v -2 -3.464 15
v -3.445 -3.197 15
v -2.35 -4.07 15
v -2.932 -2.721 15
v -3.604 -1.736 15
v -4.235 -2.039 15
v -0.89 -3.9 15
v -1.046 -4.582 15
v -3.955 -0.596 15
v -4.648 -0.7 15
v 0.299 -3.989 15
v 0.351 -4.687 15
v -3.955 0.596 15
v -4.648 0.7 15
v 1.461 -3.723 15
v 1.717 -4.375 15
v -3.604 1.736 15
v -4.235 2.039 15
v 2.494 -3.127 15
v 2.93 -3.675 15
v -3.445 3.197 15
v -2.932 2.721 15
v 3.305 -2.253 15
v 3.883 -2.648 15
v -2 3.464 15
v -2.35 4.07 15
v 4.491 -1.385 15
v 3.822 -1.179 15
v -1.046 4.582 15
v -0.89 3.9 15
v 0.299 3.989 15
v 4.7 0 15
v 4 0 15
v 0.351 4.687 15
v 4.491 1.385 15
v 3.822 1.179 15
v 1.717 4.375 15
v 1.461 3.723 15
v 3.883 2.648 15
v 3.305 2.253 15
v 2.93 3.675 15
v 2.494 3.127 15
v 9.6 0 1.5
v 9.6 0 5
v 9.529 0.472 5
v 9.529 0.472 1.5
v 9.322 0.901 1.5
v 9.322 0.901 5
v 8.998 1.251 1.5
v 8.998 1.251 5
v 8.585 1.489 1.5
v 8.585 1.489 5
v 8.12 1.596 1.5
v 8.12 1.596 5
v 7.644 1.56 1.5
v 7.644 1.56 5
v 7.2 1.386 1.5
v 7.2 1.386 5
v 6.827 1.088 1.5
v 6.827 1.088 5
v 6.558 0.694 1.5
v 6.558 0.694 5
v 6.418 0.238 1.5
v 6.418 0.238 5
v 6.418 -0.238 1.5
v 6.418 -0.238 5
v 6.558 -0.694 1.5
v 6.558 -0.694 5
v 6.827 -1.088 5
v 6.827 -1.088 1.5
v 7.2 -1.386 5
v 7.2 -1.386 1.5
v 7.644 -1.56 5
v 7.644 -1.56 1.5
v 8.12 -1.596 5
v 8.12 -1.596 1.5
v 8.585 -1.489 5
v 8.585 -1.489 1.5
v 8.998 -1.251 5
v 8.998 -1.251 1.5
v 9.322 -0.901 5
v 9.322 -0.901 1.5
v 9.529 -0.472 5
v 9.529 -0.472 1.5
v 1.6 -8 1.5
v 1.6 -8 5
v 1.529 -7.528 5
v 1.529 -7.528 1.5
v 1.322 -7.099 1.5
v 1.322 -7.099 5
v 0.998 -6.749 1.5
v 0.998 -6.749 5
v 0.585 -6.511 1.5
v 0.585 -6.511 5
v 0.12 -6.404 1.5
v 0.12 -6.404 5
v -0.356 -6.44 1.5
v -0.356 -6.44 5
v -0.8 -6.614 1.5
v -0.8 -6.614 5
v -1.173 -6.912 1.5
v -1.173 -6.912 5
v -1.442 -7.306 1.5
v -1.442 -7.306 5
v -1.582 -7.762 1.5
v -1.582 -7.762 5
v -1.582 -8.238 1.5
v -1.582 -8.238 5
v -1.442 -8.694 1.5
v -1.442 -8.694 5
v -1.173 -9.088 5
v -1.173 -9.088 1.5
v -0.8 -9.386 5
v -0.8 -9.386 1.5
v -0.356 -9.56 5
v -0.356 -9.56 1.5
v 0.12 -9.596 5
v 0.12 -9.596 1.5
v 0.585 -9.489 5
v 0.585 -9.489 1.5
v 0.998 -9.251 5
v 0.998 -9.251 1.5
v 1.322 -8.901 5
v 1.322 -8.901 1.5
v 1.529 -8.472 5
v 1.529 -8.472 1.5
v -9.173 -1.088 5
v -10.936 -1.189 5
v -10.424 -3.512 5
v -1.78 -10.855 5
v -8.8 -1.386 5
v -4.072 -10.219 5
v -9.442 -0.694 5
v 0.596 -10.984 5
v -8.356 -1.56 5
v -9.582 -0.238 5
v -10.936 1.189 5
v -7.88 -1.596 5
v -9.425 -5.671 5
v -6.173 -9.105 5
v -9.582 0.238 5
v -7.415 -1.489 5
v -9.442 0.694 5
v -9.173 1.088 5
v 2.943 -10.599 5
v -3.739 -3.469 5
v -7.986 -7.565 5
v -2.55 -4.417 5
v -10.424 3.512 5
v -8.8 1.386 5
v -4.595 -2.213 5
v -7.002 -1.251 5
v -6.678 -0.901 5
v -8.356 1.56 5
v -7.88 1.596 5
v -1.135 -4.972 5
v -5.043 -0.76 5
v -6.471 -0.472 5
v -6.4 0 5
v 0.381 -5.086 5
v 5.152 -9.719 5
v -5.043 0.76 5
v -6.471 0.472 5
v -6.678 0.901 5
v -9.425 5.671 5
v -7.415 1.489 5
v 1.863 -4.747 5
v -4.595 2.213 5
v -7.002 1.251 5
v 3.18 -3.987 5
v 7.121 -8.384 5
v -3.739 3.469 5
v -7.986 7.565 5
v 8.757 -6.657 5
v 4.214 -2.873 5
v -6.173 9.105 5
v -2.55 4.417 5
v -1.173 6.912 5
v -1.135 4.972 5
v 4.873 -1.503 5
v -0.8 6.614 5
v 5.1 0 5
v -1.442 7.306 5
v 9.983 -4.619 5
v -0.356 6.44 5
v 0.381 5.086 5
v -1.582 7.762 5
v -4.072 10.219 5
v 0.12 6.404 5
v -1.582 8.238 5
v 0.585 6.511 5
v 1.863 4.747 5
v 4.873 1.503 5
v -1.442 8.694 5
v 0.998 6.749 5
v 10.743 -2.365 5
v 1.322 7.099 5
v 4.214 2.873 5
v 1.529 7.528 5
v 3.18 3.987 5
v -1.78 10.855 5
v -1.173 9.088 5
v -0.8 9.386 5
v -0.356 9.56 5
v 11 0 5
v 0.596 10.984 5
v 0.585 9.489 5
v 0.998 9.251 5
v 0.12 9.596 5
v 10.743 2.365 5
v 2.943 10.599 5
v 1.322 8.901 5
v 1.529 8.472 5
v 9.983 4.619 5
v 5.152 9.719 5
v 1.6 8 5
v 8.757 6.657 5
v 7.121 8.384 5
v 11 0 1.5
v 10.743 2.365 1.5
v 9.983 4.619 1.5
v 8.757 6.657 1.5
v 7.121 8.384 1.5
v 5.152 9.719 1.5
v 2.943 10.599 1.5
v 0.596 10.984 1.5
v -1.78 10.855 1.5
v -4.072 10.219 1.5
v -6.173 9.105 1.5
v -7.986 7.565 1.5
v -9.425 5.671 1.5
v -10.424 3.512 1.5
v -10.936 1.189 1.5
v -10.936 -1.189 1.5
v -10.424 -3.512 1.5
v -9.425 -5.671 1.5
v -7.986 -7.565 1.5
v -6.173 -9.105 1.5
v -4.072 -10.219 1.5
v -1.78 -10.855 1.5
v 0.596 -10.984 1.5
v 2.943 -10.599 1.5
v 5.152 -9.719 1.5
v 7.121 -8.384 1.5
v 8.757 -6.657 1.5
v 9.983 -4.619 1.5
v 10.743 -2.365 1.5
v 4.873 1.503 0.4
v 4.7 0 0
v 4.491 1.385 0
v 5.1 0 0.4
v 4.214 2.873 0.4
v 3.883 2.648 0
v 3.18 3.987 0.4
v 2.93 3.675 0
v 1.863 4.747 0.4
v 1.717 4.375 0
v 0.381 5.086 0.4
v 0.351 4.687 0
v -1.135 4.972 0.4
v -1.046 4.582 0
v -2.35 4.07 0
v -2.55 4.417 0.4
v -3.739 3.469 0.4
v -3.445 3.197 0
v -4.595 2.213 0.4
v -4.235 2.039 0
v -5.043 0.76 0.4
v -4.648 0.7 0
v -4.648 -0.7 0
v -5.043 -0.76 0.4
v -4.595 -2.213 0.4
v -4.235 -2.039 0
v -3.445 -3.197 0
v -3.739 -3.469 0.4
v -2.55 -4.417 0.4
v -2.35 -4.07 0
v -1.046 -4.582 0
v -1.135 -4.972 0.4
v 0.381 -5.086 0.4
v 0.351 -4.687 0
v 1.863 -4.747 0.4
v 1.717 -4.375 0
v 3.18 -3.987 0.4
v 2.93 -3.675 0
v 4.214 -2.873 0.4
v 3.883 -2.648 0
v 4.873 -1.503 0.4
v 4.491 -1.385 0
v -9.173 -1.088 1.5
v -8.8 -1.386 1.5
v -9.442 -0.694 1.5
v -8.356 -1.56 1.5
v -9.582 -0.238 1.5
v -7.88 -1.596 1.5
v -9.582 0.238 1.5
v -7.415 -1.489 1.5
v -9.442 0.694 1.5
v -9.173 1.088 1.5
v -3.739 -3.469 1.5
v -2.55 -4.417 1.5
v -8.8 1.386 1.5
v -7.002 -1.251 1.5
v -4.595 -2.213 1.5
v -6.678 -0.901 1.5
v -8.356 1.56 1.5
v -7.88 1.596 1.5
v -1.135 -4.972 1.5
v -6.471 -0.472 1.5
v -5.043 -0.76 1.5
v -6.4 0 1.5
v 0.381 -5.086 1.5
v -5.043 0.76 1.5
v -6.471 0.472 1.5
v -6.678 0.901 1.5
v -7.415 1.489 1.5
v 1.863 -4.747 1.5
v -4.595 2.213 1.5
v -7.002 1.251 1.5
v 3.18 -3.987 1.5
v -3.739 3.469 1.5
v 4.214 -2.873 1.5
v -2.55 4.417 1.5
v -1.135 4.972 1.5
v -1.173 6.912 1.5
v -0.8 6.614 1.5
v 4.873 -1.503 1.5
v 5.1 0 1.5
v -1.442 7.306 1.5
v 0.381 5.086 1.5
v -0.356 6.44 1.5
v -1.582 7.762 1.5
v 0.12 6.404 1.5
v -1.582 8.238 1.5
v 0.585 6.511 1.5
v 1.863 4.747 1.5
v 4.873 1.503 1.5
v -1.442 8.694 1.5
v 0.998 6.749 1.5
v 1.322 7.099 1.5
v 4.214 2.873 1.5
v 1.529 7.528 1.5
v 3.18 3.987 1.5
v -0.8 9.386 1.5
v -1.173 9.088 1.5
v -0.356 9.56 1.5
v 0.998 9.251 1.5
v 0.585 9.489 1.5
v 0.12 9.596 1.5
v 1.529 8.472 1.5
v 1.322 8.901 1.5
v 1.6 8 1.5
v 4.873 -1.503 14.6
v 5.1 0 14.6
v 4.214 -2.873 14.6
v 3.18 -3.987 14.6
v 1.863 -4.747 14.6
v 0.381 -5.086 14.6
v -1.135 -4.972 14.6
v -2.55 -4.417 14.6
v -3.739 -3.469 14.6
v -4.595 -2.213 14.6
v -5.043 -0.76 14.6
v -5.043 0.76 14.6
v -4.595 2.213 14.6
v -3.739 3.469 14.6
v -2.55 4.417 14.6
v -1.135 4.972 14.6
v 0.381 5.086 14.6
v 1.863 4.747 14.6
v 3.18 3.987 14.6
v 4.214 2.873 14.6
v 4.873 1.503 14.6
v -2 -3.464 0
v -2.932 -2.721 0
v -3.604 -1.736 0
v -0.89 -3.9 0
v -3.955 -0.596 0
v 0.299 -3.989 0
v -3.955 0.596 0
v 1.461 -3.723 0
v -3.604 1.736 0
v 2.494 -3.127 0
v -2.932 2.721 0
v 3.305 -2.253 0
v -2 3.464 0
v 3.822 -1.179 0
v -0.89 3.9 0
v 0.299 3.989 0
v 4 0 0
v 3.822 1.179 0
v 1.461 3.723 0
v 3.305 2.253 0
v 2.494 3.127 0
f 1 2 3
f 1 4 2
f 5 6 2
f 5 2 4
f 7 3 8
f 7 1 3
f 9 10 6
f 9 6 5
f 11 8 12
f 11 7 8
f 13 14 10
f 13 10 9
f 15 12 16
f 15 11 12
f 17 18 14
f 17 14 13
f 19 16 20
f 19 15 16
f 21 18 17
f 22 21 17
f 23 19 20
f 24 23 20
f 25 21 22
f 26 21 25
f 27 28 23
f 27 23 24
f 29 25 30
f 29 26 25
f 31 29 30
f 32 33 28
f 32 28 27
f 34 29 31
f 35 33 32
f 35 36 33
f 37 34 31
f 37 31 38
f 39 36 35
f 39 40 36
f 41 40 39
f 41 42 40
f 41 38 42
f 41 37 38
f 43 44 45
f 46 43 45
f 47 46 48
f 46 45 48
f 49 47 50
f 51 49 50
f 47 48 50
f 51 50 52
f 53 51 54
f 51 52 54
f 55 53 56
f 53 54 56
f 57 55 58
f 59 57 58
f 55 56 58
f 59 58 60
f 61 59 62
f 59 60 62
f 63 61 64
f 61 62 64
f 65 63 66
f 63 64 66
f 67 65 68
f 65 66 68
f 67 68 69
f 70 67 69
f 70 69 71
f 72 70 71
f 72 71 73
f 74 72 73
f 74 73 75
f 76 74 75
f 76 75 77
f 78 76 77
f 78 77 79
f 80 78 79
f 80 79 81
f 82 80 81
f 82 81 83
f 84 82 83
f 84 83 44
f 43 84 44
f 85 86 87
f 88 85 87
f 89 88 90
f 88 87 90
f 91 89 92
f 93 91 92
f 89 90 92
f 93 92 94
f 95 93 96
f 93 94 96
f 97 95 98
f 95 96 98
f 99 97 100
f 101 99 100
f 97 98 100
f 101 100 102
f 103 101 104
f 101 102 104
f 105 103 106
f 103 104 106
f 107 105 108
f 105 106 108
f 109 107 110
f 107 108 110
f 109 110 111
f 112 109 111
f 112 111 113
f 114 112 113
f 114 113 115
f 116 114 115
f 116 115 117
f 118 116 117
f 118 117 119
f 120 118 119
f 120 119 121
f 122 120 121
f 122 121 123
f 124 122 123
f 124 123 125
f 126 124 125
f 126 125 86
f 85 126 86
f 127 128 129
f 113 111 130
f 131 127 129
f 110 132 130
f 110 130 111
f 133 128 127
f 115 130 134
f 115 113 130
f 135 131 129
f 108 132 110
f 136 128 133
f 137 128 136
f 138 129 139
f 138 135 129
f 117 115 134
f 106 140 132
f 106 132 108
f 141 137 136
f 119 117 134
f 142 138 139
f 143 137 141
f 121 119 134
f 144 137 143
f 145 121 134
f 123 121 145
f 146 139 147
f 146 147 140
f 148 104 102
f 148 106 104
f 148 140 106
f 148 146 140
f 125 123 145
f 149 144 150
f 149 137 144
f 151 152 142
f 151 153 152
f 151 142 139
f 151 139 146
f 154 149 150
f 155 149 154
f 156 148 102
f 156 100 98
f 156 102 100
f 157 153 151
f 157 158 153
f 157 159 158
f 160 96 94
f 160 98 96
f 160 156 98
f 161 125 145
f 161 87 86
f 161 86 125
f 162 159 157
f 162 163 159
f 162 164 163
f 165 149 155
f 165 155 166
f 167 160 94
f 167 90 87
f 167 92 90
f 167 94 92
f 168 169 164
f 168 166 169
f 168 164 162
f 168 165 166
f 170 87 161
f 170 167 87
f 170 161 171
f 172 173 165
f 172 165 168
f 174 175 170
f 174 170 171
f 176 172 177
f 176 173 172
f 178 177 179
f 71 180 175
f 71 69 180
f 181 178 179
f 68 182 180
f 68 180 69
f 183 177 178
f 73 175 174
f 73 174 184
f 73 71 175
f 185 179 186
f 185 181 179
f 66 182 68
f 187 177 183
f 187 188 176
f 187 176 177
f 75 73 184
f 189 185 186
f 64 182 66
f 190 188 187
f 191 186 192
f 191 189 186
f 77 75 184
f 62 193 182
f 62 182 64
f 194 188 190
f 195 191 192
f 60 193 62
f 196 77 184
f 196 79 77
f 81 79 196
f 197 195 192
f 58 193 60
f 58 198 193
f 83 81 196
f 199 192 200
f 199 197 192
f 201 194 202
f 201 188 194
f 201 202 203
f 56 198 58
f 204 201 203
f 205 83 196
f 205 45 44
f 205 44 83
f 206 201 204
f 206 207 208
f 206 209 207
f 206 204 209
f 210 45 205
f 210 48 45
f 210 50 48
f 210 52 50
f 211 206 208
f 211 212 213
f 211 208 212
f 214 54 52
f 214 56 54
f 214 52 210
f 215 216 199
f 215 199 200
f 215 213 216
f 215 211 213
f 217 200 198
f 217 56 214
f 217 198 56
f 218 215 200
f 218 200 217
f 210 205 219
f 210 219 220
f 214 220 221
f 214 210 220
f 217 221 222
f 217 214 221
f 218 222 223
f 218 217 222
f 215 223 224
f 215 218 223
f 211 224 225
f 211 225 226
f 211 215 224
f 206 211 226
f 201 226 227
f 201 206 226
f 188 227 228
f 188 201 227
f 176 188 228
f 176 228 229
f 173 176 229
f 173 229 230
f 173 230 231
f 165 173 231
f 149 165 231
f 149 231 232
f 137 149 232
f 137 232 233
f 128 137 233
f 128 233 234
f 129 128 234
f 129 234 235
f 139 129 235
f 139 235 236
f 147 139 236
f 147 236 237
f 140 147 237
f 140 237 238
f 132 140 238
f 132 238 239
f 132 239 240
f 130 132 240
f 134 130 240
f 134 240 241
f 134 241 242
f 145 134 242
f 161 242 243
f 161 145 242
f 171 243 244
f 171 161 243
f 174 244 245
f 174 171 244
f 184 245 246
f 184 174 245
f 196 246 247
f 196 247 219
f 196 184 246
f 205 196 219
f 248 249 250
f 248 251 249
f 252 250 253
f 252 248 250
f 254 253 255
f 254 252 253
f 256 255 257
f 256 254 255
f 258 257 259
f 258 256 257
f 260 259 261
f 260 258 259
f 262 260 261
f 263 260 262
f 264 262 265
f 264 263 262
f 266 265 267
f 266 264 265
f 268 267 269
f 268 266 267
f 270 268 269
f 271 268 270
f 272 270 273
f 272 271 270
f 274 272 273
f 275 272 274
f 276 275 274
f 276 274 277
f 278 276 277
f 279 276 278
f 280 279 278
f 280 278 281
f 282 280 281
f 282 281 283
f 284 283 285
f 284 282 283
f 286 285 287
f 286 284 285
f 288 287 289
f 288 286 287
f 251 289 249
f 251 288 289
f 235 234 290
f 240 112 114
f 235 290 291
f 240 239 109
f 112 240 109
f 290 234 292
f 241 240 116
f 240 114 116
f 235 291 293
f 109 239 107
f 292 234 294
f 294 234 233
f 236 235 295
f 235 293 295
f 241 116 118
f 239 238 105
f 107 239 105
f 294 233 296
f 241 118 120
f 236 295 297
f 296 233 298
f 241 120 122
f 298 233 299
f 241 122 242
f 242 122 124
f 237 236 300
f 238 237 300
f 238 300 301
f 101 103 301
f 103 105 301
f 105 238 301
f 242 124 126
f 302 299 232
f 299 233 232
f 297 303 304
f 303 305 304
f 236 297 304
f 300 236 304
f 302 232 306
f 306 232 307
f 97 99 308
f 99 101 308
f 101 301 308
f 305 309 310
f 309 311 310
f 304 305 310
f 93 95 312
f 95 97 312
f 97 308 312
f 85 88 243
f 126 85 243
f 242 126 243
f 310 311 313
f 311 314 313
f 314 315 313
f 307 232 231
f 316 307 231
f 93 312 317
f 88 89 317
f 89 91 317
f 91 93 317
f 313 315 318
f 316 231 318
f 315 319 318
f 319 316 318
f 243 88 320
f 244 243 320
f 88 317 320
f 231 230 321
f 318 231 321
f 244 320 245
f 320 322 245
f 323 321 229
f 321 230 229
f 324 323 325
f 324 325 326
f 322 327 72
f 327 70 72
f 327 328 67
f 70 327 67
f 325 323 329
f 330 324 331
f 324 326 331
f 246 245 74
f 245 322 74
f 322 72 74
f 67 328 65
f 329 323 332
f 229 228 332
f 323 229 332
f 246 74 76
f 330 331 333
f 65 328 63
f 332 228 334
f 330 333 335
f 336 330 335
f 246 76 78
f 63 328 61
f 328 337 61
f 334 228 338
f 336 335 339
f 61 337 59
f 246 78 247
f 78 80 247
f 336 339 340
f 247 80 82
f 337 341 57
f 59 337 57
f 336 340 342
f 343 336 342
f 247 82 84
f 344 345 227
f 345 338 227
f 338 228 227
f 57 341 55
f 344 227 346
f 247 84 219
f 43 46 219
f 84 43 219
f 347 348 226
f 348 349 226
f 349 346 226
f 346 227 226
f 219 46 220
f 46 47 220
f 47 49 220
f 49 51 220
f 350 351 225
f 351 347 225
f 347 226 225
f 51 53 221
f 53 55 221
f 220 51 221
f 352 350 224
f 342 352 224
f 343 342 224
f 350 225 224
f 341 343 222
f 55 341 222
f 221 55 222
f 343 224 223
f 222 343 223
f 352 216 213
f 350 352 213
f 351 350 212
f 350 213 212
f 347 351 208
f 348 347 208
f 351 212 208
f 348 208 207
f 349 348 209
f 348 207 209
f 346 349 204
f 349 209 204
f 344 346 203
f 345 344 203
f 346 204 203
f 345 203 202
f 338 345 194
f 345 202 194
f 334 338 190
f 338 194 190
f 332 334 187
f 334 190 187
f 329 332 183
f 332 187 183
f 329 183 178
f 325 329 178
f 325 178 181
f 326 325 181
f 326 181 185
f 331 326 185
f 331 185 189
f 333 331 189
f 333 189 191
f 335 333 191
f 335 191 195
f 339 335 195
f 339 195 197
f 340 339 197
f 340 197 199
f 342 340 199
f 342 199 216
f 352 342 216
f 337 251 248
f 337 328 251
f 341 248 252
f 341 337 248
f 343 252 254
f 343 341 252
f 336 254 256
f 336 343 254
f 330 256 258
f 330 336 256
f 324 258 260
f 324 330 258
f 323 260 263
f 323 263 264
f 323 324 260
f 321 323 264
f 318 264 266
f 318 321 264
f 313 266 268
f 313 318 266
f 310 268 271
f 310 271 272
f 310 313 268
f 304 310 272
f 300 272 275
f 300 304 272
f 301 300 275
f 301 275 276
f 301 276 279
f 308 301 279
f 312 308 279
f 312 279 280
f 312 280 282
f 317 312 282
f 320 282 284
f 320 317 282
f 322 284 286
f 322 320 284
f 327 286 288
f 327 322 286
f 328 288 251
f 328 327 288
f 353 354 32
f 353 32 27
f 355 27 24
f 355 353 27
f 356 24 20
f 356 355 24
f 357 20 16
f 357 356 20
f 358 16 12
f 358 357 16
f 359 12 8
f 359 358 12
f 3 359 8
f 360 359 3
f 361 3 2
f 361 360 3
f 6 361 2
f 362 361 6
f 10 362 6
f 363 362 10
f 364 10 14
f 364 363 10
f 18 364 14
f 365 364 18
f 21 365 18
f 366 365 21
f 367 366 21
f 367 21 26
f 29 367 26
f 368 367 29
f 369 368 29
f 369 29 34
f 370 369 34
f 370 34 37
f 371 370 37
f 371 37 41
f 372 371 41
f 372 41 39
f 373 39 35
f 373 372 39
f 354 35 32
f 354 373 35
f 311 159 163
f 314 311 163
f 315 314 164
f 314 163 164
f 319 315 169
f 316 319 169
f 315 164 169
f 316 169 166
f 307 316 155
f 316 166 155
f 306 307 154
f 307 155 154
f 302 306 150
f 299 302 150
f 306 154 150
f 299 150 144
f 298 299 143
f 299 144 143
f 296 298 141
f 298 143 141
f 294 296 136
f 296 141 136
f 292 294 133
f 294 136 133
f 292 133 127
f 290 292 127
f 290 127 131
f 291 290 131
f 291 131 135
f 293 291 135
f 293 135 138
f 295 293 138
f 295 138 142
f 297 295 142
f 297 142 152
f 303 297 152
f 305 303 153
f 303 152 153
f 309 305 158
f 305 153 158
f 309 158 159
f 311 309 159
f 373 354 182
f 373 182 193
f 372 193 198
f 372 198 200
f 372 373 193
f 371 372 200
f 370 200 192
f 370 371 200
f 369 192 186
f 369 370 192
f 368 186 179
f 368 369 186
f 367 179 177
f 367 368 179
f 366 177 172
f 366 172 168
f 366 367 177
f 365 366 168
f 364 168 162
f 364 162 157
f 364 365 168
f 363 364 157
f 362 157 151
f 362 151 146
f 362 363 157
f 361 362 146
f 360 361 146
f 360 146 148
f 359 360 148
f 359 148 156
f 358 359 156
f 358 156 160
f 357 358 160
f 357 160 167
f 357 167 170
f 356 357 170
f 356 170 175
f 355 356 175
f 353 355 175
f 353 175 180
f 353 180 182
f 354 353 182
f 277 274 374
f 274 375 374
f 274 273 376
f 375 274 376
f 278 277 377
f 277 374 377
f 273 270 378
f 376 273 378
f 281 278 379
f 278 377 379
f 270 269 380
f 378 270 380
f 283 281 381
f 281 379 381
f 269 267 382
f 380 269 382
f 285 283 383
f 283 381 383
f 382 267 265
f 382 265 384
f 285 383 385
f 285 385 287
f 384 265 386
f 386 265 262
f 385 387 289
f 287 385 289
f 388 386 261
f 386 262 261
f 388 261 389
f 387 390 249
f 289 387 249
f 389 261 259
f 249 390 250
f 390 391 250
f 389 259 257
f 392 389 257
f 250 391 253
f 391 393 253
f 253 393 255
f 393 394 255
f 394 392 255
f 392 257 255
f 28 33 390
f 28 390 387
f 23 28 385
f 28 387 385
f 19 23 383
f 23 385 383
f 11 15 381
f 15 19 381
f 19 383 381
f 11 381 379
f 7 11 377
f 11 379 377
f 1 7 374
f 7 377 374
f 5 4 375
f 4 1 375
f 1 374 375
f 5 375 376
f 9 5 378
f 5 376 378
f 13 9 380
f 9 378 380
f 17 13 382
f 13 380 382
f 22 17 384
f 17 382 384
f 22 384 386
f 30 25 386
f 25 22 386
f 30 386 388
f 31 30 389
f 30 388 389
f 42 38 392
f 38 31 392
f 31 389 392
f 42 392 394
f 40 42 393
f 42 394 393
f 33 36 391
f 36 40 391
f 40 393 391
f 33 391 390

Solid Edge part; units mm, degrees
sketch "Sketch1" plane through (0, 0, 0) normal (0, -1, 0) x (1, 0, 0)
  line L0 (5.1, 0) -> (5.1, 1.5)
  line L1 (5.1, 1.5) -> (11, 1.5)
  line L2 (11, 1.5) -> (11, 5)
  line L3 (11, 5) -> (5.1, 5)
  line L4 (5.1, 5) -> (5.1, 15)
  line L5 (5.1, 15) -> (4, 15)
  line L6 (4, 15) -> (4, 0)
  line L7 (4, 0) -> (5.1, 0)
  dimension "D1" = 4
  dimension "D2" = 11
  dimension "D3" = 5.1
  dimension "D4" = 1.5
  dimension "D5" = 3.5
  dimension "D6" = 10
revolve "RevolvedProtrusion1" add sketch "Sketch1" angle 360 about axis through (0, 0, 0) along (0, 0, 1)
sketch "Sketch2" plane through (0, 0, 5) normal (0, 0, 1) x (1, 0, 0)
  circle A0 centre (0, 8) radius 1.6
  circle A1 centre (8, 0) radius 1.6
  circle A2 centre (0, -8) radius 1.6
  circle A3 centre (-8, 0) radius 1.6
  dimension "D1" = 3.2
  dimension "D2" = 16
extrude "Cutout1" cut sketch "Sketch2" against normal through all
chamfer "Chamfer1" distance 0.4 angle 45 2 edges at (-5.1, 0, 15) (-5.1, 0, 0)
